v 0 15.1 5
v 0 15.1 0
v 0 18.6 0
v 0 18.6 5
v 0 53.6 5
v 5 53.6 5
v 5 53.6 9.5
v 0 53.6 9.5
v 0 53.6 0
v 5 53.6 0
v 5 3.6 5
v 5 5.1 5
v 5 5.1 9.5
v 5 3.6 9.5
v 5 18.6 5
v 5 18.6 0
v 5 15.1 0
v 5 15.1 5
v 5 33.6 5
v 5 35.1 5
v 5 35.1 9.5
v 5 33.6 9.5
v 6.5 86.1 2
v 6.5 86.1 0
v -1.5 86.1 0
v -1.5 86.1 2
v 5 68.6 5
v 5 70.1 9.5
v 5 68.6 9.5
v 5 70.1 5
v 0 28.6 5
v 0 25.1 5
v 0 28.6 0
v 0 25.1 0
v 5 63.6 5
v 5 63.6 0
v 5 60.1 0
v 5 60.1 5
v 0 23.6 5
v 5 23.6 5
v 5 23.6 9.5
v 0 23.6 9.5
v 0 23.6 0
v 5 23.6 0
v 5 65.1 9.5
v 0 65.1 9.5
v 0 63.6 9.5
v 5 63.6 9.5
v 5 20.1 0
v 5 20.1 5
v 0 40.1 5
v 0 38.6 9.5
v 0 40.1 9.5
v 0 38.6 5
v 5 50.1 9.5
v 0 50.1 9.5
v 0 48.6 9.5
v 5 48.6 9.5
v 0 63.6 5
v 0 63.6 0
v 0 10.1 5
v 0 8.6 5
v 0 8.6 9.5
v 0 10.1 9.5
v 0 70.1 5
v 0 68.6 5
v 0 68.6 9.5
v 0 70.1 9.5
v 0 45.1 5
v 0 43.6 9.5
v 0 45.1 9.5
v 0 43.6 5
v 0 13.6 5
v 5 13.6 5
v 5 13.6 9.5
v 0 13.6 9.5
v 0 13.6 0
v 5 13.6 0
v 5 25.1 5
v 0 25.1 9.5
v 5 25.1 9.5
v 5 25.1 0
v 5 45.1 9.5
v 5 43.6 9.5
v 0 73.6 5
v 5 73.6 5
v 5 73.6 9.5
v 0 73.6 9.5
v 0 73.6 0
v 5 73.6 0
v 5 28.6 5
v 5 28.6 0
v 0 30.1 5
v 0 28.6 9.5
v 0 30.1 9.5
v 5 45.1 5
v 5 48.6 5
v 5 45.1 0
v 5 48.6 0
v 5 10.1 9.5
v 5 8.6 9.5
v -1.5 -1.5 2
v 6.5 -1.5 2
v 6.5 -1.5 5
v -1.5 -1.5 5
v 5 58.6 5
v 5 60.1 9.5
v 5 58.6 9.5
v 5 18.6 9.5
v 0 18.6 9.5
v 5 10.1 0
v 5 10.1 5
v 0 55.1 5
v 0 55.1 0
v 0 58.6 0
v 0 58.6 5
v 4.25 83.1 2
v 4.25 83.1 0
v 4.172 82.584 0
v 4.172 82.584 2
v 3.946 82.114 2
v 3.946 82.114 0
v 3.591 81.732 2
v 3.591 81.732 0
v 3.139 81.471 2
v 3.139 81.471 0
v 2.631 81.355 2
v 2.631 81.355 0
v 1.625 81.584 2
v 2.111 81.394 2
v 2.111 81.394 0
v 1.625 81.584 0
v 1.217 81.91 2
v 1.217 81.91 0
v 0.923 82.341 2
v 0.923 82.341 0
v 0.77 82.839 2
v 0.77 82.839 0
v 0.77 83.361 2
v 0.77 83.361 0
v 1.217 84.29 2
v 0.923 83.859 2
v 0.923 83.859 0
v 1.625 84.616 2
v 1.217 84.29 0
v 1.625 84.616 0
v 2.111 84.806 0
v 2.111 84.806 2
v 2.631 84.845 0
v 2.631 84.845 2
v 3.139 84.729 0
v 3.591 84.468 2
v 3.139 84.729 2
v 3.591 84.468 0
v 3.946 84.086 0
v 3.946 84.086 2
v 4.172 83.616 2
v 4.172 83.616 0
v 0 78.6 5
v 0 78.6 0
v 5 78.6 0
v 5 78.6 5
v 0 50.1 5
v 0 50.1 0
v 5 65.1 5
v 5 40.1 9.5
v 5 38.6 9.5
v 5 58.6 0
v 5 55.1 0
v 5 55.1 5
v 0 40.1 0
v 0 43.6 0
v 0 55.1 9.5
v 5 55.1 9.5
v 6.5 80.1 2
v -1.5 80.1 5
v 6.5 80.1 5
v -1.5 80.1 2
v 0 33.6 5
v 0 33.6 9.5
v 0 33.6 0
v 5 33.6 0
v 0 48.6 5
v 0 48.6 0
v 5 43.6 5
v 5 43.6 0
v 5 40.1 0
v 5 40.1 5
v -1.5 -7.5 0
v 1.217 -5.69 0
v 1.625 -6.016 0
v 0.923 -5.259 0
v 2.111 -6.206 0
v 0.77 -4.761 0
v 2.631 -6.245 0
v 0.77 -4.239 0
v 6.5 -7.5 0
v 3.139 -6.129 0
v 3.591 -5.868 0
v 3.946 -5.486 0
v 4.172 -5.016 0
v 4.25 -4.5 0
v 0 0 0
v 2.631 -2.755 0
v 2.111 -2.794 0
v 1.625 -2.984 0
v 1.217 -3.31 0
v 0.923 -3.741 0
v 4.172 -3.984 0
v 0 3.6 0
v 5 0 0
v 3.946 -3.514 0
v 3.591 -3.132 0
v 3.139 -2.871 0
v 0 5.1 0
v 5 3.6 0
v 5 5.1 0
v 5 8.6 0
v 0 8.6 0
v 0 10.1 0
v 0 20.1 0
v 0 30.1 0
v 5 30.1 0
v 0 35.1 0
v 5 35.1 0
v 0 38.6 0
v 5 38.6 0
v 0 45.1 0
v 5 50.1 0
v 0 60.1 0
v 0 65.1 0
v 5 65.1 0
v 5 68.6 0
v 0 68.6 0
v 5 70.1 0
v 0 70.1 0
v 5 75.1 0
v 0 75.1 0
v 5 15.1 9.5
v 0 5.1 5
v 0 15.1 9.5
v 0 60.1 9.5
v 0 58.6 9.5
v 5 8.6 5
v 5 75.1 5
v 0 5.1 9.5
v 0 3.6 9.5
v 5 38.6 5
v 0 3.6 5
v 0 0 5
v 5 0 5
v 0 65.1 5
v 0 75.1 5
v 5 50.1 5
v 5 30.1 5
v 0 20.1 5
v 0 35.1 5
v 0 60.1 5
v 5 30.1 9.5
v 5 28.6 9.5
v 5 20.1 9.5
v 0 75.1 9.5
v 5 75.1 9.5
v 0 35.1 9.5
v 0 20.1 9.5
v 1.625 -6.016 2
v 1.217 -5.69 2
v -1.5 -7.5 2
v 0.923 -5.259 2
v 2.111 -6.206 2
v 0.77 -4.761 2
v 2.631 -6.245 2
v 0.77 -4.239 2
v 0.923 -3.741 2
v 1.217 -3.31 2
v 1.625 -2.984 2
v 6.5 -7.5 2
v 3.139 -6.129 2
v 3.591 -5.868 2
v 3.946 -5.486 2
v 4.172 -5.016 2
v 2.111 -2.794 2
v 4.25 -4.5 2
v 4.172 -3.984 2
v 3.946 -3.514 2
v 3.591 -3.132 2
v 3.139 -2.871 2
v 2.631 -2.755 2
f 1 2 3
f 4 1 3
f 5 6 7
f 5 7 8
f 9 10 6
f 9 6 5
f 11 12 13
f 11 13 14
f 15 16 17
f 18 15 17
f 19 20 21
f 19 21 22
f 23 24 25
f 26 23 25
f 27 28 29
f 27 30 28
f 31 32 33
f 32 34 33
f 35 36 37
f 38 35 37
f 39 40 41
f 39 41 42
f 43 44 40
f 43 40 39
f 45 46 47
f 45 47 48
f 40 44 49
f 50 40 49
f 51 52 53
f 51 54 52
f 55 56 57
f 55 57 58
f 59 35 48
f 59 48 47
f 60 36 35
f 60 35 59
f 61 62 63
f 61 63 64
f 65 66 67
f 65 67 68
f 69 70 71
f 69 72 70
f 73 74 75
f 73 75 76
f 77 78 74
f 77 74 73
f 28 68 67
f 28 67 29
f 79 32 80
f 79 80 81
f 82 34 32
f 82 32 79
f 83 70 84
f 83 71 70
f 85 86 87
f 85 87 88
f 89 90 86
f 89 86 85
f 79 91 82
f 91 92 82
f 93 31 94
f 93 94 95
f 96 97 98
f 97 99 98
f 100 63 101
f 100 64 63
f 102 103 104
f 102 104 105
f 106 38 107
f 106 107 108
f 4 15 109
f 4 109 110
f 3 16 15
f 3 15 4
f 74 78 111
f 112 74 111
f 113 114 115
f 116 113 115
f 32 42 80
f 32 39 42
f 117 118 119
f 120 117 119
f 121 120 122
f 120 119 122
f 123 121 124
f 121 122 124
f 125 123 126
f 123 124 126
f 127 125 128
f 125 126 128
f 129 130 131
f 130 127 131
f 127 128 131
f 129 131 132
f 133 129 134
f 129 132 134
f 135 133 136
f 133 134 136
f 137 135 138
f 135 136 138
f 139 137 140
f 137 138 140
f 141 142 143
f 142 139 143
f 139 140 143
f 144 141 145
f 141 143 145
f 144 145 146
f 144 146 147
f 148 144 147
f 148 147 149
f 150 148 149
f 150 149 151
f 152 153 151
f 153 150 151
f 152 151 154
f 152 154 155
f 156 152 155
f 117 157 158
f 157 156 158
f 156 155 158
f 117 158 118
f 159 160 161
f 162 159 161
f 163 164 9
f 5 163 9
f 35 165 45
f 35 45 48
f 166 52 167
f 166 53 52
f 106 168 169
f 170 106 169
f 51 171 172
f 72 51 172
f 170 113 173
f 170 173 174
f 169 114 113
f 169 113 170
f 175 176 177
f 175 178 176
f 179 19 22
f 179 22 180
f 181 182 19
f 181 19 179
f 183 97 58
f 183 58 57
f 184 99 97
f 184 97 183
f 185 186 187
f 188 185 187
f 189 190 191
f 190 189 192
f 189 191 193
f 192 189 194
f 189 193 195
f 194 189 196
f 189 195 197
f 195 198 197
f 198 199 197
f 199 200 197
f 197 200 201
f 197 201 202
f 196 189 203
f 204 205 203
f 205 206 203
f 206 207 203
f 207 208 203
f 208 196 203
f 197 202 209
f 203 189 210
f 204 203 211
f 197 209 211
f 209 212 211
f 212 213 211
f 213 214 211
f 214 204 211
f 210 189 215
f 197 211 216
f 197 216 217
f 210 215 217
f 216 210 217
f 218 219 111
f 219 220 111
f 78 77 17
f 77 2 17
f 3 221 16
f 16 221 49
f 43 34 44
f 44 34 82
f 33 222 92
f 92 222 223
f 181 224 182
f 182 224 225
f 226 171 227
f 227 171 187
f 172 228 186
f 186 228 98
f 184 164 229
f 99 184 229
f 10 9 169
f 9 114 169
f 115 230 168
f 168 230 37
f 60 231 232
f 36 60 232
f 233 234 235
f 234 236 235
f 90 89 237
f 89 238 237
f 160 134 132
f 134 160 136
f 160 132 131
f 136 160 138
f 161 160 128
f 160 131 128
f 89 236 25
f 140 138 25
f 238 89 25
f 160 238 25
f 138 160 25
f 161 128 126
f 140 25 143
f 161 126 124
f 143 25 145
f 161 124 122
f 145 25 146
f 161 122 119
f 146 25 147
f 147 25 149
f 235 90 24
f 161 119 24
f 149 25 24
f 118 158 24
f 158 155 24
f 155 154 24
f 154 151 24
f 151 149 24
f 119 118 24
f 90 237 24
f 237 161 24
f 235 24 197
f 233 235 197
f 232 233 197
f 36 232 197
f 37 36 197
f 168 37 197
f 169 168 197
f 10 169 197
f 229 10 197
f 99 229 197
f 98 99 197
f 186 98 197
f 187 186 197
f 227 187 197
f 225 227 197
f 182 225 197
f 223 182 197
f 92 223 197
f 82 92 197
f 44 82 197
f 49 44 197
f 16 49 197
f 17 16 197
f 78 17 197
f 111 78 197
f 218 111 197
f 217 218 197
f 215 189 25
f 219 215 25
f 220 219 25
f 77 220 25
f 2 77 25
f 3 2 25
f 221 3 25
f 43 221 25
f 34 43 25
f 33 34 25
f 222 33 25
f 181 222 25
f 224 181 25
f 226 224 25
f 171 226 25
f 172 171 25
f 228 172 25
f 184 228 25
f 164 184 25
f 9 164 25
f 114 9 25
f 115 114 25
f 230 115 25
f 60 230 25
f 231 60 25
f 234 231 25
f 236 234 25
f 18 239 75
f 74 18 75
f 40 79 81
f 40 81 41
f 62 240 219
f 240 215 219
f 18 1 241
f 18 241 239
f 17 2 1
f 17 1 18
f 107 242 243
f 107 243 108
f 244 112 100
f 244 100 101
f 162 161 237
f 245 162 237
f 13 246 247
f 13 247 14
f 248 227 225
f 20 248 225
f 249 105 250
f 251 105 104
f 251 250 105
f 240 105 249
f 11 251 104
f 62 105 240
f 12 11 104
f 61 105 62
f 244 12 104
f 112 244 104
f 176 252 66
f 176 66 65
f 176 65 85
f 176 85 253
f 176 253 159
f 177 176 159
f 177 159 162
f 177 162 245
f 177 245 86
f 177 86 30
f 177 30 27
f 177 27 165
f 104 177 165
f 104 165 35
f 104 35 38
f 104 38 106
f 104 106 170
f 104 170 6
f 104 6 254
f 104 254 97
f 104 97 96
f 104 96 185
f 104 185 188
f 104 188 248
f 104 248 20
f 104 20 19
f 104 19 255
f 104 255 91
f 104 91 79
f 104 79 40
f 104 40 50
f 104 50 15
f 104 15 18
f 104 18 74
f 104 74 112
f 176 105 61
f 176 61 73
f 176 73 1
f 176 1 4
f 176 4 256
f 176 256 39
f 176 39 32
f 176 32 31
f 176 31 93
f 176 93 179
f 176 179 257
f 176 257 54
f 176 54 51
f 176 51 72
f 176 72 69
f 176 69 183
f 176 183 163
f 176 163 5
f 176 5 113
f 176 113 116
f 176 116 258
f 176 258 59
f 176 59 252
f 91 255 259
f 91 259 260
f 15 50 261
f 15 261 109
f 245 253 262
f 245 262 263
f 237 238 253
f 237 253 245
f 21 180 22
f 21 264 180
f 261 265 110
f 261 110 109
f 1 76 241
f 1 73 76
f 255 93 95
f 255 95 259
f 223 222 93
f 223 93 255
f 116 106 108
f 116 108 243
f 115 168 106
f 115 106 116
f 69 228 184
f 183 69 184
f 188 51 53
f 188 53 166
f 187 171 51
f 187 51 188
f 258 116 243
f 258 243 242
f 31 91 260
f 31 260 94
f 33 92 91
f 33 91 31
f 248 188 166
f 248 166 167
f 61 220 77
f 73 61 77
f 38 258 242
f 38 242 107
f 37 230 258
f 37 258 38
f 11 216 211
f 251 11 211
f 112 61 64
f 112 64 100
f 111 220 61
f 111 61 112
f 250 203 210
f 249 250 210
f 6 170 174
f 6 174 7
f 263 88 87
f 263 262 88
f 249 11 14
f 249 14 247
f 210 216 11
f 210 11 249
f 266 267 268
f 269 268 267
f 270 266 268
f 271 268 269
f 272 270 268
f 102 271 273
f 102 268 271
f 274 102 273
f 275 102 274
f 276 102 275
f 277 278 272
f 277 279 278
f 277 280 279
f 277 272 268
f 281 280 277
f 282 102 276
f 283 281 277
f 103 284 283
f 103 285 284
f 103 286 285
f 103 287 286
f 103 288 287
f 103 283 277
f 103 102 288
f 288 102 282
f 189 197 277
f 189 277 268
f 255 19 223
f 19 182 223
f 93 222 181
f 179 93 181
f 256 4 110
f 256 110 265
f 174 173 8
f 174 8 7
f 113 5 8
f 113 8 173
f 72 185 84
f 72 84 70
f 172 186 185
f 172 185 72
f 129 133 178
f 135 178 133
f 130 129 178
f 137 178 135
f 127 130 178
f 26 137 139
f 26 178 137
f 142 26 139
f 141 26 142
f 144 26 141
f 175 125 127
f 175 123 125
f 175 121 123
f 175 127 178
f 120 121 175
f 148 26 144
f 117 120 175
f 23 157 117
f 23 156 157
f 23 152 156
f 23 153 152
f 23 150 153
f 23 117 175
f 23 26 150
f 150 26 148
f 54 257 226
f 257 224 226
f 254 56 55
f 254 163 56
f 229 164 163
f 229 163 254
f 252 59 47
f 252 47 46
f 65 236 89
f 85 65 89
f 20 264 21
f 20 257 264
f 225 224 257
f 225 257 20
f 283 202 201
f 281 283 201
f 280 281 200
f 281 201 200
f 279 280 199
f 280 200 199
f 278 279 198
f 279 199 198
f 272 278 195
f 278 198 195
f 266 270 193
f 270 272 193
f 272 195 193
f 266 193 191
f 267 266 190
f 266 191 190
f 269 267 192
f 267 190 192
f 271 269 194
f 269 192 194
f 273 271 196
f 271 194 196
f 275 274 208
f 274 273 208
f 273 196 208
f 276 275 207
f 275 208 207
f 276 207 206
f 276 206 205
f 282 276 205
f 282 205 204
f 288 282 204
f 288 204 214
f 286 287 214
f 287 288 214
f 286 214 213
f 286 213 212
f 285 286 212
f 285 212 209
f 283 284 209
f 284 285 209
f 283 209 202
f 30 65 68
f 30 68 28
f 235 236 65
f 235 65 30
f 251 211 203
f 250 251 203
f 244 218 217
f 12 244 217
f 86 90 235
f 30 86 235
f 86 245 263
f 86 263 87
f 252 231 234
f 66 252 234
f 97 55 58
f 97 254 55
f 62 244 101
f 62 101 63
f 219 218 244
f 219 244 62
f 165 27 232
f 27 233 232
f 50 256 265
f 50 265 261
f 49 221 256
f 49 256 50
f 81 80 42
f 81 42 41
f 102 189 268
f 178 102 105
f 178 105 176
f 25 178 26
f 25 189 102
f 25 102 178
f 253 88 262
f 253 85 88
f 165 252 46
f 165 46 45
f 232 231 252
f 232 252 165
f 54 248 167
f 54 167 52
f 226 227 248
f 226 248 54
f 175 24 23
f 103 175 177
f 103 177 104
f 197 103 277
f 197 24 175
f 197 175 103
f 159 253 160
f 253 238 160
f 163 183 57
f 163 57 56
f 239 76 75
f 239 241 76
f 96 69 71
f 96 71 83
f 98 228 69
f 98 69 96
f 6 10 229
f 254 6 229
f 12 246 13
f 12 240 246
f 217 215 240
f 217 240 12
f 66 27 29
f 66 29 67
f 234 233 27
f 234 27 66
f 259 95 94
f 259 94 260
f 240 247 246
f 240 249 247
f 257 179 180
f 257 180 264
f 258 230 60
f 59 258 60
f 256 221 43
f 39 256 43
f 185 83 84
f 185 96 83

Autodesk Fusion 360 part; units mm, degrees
sketch "スケッチ1" plane through (0, 0, 0) normal (0, 0, 1) x (1, 0, 0)
  line L0 (1.5, 1.2) -> (3.5, 1.2)
  line L1 (3.5, 1.2) -> (3.5, 2.4)
  line L2 (3.5, 2.4) -> (1.5, 2.4)
  line L3 (1.5, 2.4) -> (1.5, 1.2)
  line L4 (1.5, 6.2) -> (3.5, 6.2)
  line L5 (3.5, 7.4) -> (1.5, 7.4)
  line L6 (3.5, 6.2) -> (3.5, 7.4)
  line L7 (1.5, 7.4) -> (1.5, 6.2)
  line L8 (1.5, 11.2) -> (3.5, 11.2)
  line L9 (3.5, 12.4) -> (1.5, 12.4)
  line L10 (3.5, 11.2) -> (3.5, 12.4)
  line L11 (1.5, 12.4) -> (1.5, 11.2)
  line L12 (1.5, 16.2) -> (3.5, 16.2)
  line L13 (3.5, 17.4) -> (1.5, 17.4)
  line L14 (3.5, 16.2) -> (3.5, 17.4)
  line L15 (1.5, 17.4) -> (1.5, 16.2)
  line L16 (1.5, 21.2) -> (3.5, 21.2)
  line L17 (3.5, 22.4) -> (1.5, 22.4)
  line L18 (3.5, 21.2) -> (3.5, 22.4)
  line L19 (1.5, 22.4) -> (1.5, 21.2)
  line L20 (1.5, 26.2) -> (3.5, 26.2)
  line L21 (3.5, 27.4) -> (1.5, 27.4)
  line L22 (3.5, 26.2) -> (3.5, 27.4)
  line L23 (1.5, 27.4) -> (1.5, 26.2)
  line L24 (1.5, 31.2) -> (3.5, 31.2)
  line L25 (3.5, 32.4) -> (1.5, 32.4)
  line L26 (3.5, 31.2) -> (3.5, 32.4)
  line L27 (1.5, 32.4) -> (1.5, 31.2)
  line L28 (1.5, 36.2) -> (3.5, 36.2)
  line L29 (3.5, 37.4) -> (1.5, 37.4)
  line L30 (3.5, 36.2) -> (3.5, 37.4)
  line L31 (1.5, 37.4) -> (1.5, 36.2)
  line L32 (1.5, 41.2) -> (3.5, 41.2)
  line L33 (3.5, 42.4) -> (1.5, 42.4)
  line L34 (3.5, 41.2) -> (3.5, 42.4)
  line L35 (1.5, 42.4) -> (1.5, 41.2)
  line L36 (1.5, 46.2) -> (3.5, 46.2)
  line L37 (3.5, 47.4) -> (1.5, 47.4)
  line L38 (3.5, 46.2) -> (3.5, 47.4)
  line L39 (1.5, 47.4) -> (1.5, 46.2)
  line L40 (1.5, 51.2) -> (3.5, 51.2)
  line L41 (3.5, 52.4) -> (1.5, 52.4)
  line L42 (3.5, 51.2) -> (3.5, 52.4)
  line L43 (1.5, 52.4) -> (1.5, 51.2)
  line L44 (1.5, 56.2) -> (3.5, 56.2)
  line L45 (3.5, 57.4) -> (1.5, 57.4)
  line L46 (3.5, 56.2) -> (3.5, 57.4)
  line L47 (1.5, 57.4) -> (1.5, 56.2)
  line L48 (1.5, 61.2) -> (3.5, 61.2)
  line L49 (3.5, 62.4) -> (1.5, 62.4)
  line L50 (3.5, 61.2) -> (3.5, 62.4)
  line L51 (1.5, 62.4) -> (1.5, 61.2)
  line L52 (1.5, 66.2) -> (3.5, 66.2)
  line L53 (3.5, 67.4) -> (1.5, 67.4)
  line L54 (3.5, 66.2) -> (3.5, 67.4)
  line L55 (1.5, 67.4) -> (1.5, 66.2)
  line L56 (1.5, 71.2) -> (3.5, 71.2)
  line L57 (3.5, 72.4) -> (1.5, 72.4)
  line L58 (3.5, 71.2) -> (3.5, 72.4)
  line L59 (1.5, 72.4) -> (1.5, 71.2)
  line L60 (1.5, 76.2) -> (3.5, 76.2)
  line L61 (3.5, 77.4) -> (1.5, 77.4)
  line L62 (3.5, 76.2) -> (3.5, 77.4)
  line L63 (1.5, 77.4) -> (1.5, 76.2)
  line L64 (0, 78.6) -> (5, 78.6)
  line L65 (5, 78.6) -> (5, 0)
  line L66 (5, 0) -> (0, 0)
  line L67 (0, 0) -> (0, 78.6)
  line L68 (6.5, -1.5) -> (-1.5, -1.5)
  line L69 (-1.5, -1.5) -> (-1.5, 80.1)
  line L70 (-1.5, 80.1) -> (6.5, 80.1)
  line L71 (6.5, 80.1) -> (6.5, -1.5)
  line L72 (0, 5.1) -> (5, 5.1)
  line L73 (5, 5.1) -> (5, 3.6)
  line L74 (5, 3.6) -> (0, 3.6)
  line L75 (0, 3.6) -> (0, 5.1)
  line L76 (5, 8.6) -> (0, 8.6)
  line L77 (0, 10.1) -> (5, 10.1)
  line L78 (5, 13.6) -> (0, 13.6)
  line L79 (0, 15.1) -> (5, 15.1)
  line L80 (5, 18.6) -> (0, 18.6)
  line L81 (0, 20.1) -> (5, 20.1)
  line L82 (5, 23.6) -> (0, 23.6)
  line L83 (0, 25.1) -> (5, 25.1)
  line L84 (5, 28.6) -> (0, 28.6)
  line L85 (0, 30.1) -> (5, 30.1)
  line L86 (5, 33.6) -> (0, 33.6)
  line L87 (0, 35.1) -> (5, 35.1)
  line L88 (5, 38.6) -> (0, 38.6)
  line L89 (0, 40.1) -> (5, 40.1)
  line L90 (5, 43.6) -> (0, 43.6)
  line L91 (0, 45.1) -> (5, 45.1)
  line L92 (5, 48.6) -> (0, 48.6)
  line L93 (0, 50.1) -> (5, 50.1)
  line L94 (5, 53.6) -> (0, 53.6)
  line L95 (0, 55.1) -> (5, 55.1)
  line L96 (5, 58.6) -> (0, 58.6)
  line L97 (0, 60.1) -> (5, 60.1)
  line L98 (5, 63.6) -> (0, 63.6)
  line L99 (0, 65.1) -> (5, 65.1)
  line L100 (5, 68.6) -> (0, 68.6)
  line L101 (0, 70.1) -> (5, 70.1)
  line L102 (5, 73.6) -> (0, 73.6)
  line L103 (0, 75.1) -> (5, 75.1)
  line L104 (-1.5, 80.1) -> (6.5, 80.1)
  line L105 (6.5, 80.1) -> (6.5, 86.1)
  line L106 (6.5, 86.1) -> (-1.5, 86.1)
  line L107 (-1.5, 86.1) -> (-1.5, 80.1)
  circle A0 centre (2.5, 83.1) radius 1.75
  line L108 (-1.5, -1.5) -> (6.5, -1.5)
  line L109 (6.5, -1.5) -> (6.5, -7.5)
  line L110 (6.5, -7.5) -> (-1.5, -7.5)
  line L111 (-1.5, -7.5) -> (-1.5, -1.5)
  circle A1 centre (2.5, -4.5) radius 1.75
  dimension "d1" = 2
  dimension "d2" = 1.2
  dimension "d5" = 0
  dimension "d6" = 75
  dimension "d7" = 78.6
  dimension "d8" = 1.2
  dimension "d9" = 5
  dimension "d10" = 1.5
  dimension "d11" = -1.5
  dimension "d12" = 1.5
  dimension "d15" = 0
  dimension "d16" = 70
  dimension "d17" = 1.2
  dimension "d18" = 8
  dimension "d19" = 6
  dimension "d20" = 3.5
  dimension "d21" = 4
  dimension "d22" = 3
  dimension "d23" = 8
  dimension "d24" = 6
  dimension "d25" = 3.5
  dimension "d26" = 4
  dimension "d27" = 3
extrude "押し出し1" add sketch "スケッチ1" along normal blind 5 contours L68 L69 L70 L71 L104 L108
extrude "押し出し2" add sketch "スケッチ1" along normal blind 9.5 contours L65 L67 L102 L103 | L65 L67 L100 L101 | L65 L67 L98 L99 | L65 L67 L96 L97 | L65 L67 L94 L95 | L65 L67 L92 L93 | L65 L67 L90 L91 | L65 L67 L88 L89 | L65 L67 L86 L87 | L65 L67 L84 L85 | L65 L67 L82 L83 | L65 L67 L80 L81 | L65 L67 L78 L79 | L65 L67 L76 L77 | L65 L67 L72 L73 L74 L75
extrude "押し出し3" add sketch "スケッチ1" along normal blind 2 contours L68 L108 L109 L110 L111 | L70 L104 L105 L106 L107
equation "d7 = 80 mm - 1.4 mm"
